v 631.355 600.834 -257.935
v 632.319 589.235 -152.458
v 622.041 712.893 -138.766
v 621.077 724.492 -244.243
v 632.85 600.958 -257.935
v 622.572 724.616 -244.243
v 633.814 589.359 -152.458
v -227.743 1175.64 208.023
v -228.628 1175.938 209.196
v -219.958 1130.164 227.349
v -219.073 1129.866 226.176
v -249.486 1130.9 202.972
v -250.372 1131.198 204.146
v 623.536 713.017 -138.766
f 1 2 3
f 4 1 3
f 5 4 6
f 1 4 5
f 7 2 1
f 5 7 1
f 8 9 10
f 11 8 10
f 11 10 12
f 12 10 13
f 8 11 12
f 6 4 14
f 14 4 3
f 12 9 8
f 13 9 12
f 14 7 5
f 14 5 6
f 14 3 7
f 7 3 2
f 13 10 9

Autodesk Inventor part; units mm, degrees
sketch "Assoalho" plane through (0, 0, 0) normal (0, 1, 0) x (-1, 0, 0)
  line L0 (0, 0) -> (0, -310)
  line L1 (-175, 0) -> (-175, -286.2)
  line L2 (-339, 0) -> (-339, -271.128)
  line L3 (-750, -208) -> (0, -310)
  line L4 (0, 0) -> (0, 310)
  line L5 (-175, 0) -> (-175, 286.2)
  line L6 (-339, 0) -> (-339, 271.128)
  line L7 (-750, 208) -> (0, 310)
  line L8 (-750, -208) -> (-750, 208)
  line L9 (0, -310) -> (-750, 208)
  dimension "d5" = 175
ref_plane "Plano de trabalho2" through (0, 290, 0) normal (0, 1, 0) x (-1, 0, 0)
sketch "SIM" plane through (0, 290, 0) normal (0, 1, 0) x (-1, 0, 0)
  line L0 (-635.0792, -210.9167) -> (-513.8339, -210.9167) construction
  line L1 (-1143.84, -208) -> (-685.527, -208)
  arc A0 (-592.0818, -237.4632) -> (-685.527, -208) centre (-685.527, -370.9167) ccw
  line L2 (-592.0818, -237.4632) -> (-492.7634, -307.0066)
  arc A1 (-492.7634, -307.0066) -> (-406.5021, -335.3679) centre (-402.6642, -178.3316) ccw
  line L3 (-406.5021, -335.3679) -> (72.8916, -347.0841)
  arc A2 (-685.4637, 215.6215) -> (-591.5206, 246.9682) centre (-688.2017, 380.2696) ccw
  line L4 (-591.5206, 246.9682) -> (-493.3722, 318.1534)
  arc A3 (-408.5522, 347.6124) -> (-493.3722, 318.1534) centre (-402.1758, 192.4142) ccw
  line L5 (-408.5522, 347.6124) -> (70.5804, 367.2979)
  line L6 (-1143.84, 208) -> (-1143.84, -208)
  line L7 (-1143.84, -208) -> (-1143.84, -238)
  line L8 (-1143.84, 208) -> (-1143.84, 238)
  line L9 (-685.4637, 215.6215) -> (-1143.84, 215.6215)
  point P0 (0, 0)
  point P1 (-1243.8402, -210.9167)
  point P2 (-454.8658, -337.1036)
  point P3 (-685.527, -210.9167)
  point P4 (-593.7548, -239.8524)
  point P5 (-1243.8402, 210.003)
  point P6 (-690.8063, 210.003)
  point P7 (-741.2541, 210.003)
  point P8 (-649.4819, 238.9387)
  point P9 (-741.2541, 370.003)
  point P10 (-1243.8402, 212.6709)
  point P11 (-454.8658, 338.8577)
  point P12 (-685.527, 212.6709)
  point P13 (-750, -208)
  point P14 (-1243.8402, -208)
  point P15 (-750, 208)
  point P16 (-1243.8402, 208)
  dimension "d43" = 220
  dimension "d120" = 30
ref_plane "Plano de trabalho6" through (1243.8402, 290, 0) normal (-0.9506165, 0.3103678, 0) x (0, 0, -1)
ref_plane "Plano de trabalho7" through (750, 0, -208) normal (0.0697565, -0.9975641, 0) x (0, 0, 1)
ref_plane "Plano de trabalho9" through (1243.8402, 290, -210.9167) normal (0.9596242, -0.2812853, 0) x (0, 0, 1)
ref_plane "angulo de ataque" through (1167.3877, 29.1774, -208.0001) normal (0.0693593, -0.9975917, 0) x (0, 0, 1)
sketch3d "FAB SUSP"
ref_plane "plano do tanque" through (-142.3505, 531.2591, -0.3087) normal (0.190809, -0.981627, 0.0005599) x (-0.0001453, 0.0005422, 0.9999998)
ref_plane "plano fire" through (0, 0, 0) normal (0.9816272, 0.190809, 0) x (0, 0, -1)
sketch "Firewall" plane through (0, 0, 0) normal (0.9816272, 0.190809, 0) x (0, 0, -1)
  line L0 (208.0001, 1199.5797) -> (378.6151, 762.8897)
  line L1 (-208.4266, 1199.9999) -> (-377.0246, 770.967)
  arc A0 (388.8009, 688.8354) -> (378.6151, 762.8897) centre (229.5857, 704.6638) ccw
  arc A1 (-377.0246, 770.967) -> (-387.4098, 697.4944) centre (-228.1101, 712.4478) ccw
  line L2 (-373.5449, 549.7904) -> (374.9777, 549.7904)
  line L3 (-340.0001, -0.2101) -> (340.0002, -0.2101)
  line L4 (310.0001, -0.4201) -> (-208.4266, 1199.9999)
  line L5 (-238.4267, 1199.76) -> (237.5731, 1199.76)
  line L6 (-387.4098, 697.4944) -> (-310, 0)
  line L7 (310.0001, -0.4201) -> (388.8009, 688.8354)
  point P0 (0, 0)
  point P1 (-350, 298.9658)
  point P2 (350.0001, 298.5456)
  point P3 (-395, 778.3526)
  point P4 (396.7361, 768.6549)
  dimension "d133" = 160
  dimension "d183" = 549.7904
sketch "Posição eixo final" plane through (0, 0, 0) normal (0, 0, 1) x (1, 0, 0)
  line L0 (0, 0) -> (-570, 0)
  line L1 (-570, 0) -> (-570, 10)
  circle A0 centre (-570, 10) radius 12.5
  dimension "d188" = 570
  dimension "d189" = 10
  dimension "d190" = 25
sketch3d "TRASEIRA"
sketch "OSIM" plane through (0, 290, 0) normal (0, 1, 0) x (-1, 0, 0)
  line L0 (-635.0792, -210.9167) -> (-513.8339, -210.9167) construction
  line L1 (0, 0) -> (-92.969, 0)
  line L2 (-1143.84, -208) -> (-790.5859, -208)
  line L3 (-719.9653, -235.2972) -> (-657.1896, -292.3512)
  arc A0 (-657.1896, -292.3512) -> (-591.7716, -319.5194) centre (-586.569, -214.6484) ccw
  line L4 (-1143.84, 208) -> (-790.5859, 208)
  line L5 (-719.9653, 235.2972) -> (-657.1896, 292.3512)
  arc A1 (-790.5859, 208) -> (-719.9653, 235.2972) centre (-790.5859, 313) ccw
  arc A2 (-591.7716, 319.5194) -> (-657.1896, 292.3512) centre (-586.569, 214.6484) ccw
  line L6 (-790.5859, -208) -> (-790.5859, -208)
  arc A3 (-719.9653, -235.2972) -> (-790.5859, -208) centre (-790.5859, -313) ccw
  line L7 (-591.7716, 319.5194) -> (56.424, 342.8186)
  line L8 (-591.7716, -319.5194) -> (56.1351, -343.6827)
  point P0 (-1243.8402, -210.9167)
  point P1 (-649.4819, 238.9387)
  point P2 (-690.8063, 210.003)
  point P3 (-741.2541, 370.003)
  point P4 (-741.2541, 210.003)
  point P5 (-1243.8402, 210.003)
  point P6 (-454.8658, 338.8577)
  point P7 (-685.527, 212.6709)
  point P8 (-1243.8402, 212.6709)
  point P9 (-1243.8402, -208)
  point P10 (-1243.8402, 208)
  point P11 (60.2645, -351.8668)
  point P12 (60.2645, 351.8668)
  dimension "d150" = 105
sketch3d "FAB,FBM,RHO"
sketch "Boneco De M" plane through (0, 0, 0) normal (0, 0, 1) x (1, 0, 0)
  line L0 (100.0575, 119.4039) -> (-125.5508, 886.933)
  line L1 (100.0575, 119.4039) -> (575.1964, 275.1055)
  line L2 (575.1964, 275.1055) -> (1019.3106, 68.0728)
  line L3 (100.0575, 119.4039) -> (-69.1487, 695.0507)
  line L4 (-69.1487, 695.0507) -> (87.7059, 404.7119)
  line L5 (-69.1487, 695.0507) -> (260.8513, 695.0507) construction
  line L6 (87.7059, 404.7119) -> (397.1666, 422.9889)
  arc A0 (-79.7011, 730.9504) -> (-125.5508, 886.933) centre (-81.3953, 815.1823) ccw
  point P0 (0, 0)
  dimension "d169" = 800
  dimension "d170" = 500
  dimension "d171" = 490
  dimension "d172" = 600
  dimension "d175" = 88.236
  dimension "d178" = 330
  dimension "d179" = 61.62
  dimension "d180" = 310
  dimension "d181" = 115
  dimension "d182" = 136.863
ref_plane "Plano de trabalho15" through (15.4115, 2.9957, 0) normal (0.9816272, 0.190809, 0) x (0, 0, -1)
sketch "Esboço26" plane through (-142.3505, 531.2591, -0.3087) normal (0.190809, -0.981627, 0.0005599) x (-0.0001453, 0.0005422, 0.9999998)
  line L0 (-373.237, -38.3514) -> (-160.541, 418.9921) projected
  line L1 (-305.8589, 106.5265) -> (-160.541, 106.5265)
  line L2 (-160.541, 106.5265) -> (-160.541, -38.3514)
  point P0 (0, -38.3661)
  point P1 (-139.1534, 464.9803)
ref_plane "Plano de trabalho16" through (657.1896, 290, -292.3512) normal (0.9965639, 0.0828279, 0) x (-0.0823282, 0.9905518, 0.1096777)
sketch "Esboço27" plane through (657.1896, 290, -292.3512) normal (0.9965639, 0.0828279, 0) x (-0.0823282, 0.9905518, 0.1096777)
  line L0 (769.0814, 0) -> (0, 0) projected
  line L1 (313.7984, 0) -> (438.6359, 0)
  line L2 (438.6359, 0) -> (438.6359, 106.1165)
  line L3 (438.6359, 106.1165) -> (313.7984, 106.1165)
  line L4 (313.7984, 106.1165) -> (313.7984, 0)
  point P0 (-201.0904, 316.3146)
ref_plane "Plano de trabalho18" through (750, 0, 428) normal (-0.0000001, 0.0000002, 1) x (0.9975656, 0.0697345, 0.0000001)
ref_plane "Plano de trabalho17" through (750, 0, 208) normal (-0.0000001, 0.0000002, 1) x (0.9975656, 0.0697345, 0.0000001)
extrude "Extrusão1" add sketch "Esboço27" along normal blind 1.5
sketch3d "Esboço 3D15"
ref_plane "Plano de trabalho19" through (621.7577, 699.6987, 151.4268) normal (-0.99659, -0.0812596, 0.0143283) x (0.0823337, -0.9907596, 0.1077804)
ref_plane "Plano de trabalho20" through (-615.0988, 383.4544, 118.7414) normal (0.5902078, -0.198516, -0.7824616) x (0.4348781, 0.8948063, 0.1010083)
sketch "Esboço28" plane through (-615.0988, 383.4544, 118.7414) normal (0.5902078, -0.198516, -0.7824616) x (0.4348781, 0.8948063, 0.1010083)
  line L0 (886.3239, 1.5116) -> (836.3239, 1.5116)
  line L1 (886.3239, 1.5116) -> (850.9686, 36.8669)
  line L2 (850.9686, 36.8669) -> (836.3239, 1.5116)
  point P0 (-87.6183, 498.7078)
  dimension "d245" = 50
  dimension "d246" = 50
extrude "Extrusão2" add sketch "Esboço28" along normal blind 1.5
properties part number "111"
